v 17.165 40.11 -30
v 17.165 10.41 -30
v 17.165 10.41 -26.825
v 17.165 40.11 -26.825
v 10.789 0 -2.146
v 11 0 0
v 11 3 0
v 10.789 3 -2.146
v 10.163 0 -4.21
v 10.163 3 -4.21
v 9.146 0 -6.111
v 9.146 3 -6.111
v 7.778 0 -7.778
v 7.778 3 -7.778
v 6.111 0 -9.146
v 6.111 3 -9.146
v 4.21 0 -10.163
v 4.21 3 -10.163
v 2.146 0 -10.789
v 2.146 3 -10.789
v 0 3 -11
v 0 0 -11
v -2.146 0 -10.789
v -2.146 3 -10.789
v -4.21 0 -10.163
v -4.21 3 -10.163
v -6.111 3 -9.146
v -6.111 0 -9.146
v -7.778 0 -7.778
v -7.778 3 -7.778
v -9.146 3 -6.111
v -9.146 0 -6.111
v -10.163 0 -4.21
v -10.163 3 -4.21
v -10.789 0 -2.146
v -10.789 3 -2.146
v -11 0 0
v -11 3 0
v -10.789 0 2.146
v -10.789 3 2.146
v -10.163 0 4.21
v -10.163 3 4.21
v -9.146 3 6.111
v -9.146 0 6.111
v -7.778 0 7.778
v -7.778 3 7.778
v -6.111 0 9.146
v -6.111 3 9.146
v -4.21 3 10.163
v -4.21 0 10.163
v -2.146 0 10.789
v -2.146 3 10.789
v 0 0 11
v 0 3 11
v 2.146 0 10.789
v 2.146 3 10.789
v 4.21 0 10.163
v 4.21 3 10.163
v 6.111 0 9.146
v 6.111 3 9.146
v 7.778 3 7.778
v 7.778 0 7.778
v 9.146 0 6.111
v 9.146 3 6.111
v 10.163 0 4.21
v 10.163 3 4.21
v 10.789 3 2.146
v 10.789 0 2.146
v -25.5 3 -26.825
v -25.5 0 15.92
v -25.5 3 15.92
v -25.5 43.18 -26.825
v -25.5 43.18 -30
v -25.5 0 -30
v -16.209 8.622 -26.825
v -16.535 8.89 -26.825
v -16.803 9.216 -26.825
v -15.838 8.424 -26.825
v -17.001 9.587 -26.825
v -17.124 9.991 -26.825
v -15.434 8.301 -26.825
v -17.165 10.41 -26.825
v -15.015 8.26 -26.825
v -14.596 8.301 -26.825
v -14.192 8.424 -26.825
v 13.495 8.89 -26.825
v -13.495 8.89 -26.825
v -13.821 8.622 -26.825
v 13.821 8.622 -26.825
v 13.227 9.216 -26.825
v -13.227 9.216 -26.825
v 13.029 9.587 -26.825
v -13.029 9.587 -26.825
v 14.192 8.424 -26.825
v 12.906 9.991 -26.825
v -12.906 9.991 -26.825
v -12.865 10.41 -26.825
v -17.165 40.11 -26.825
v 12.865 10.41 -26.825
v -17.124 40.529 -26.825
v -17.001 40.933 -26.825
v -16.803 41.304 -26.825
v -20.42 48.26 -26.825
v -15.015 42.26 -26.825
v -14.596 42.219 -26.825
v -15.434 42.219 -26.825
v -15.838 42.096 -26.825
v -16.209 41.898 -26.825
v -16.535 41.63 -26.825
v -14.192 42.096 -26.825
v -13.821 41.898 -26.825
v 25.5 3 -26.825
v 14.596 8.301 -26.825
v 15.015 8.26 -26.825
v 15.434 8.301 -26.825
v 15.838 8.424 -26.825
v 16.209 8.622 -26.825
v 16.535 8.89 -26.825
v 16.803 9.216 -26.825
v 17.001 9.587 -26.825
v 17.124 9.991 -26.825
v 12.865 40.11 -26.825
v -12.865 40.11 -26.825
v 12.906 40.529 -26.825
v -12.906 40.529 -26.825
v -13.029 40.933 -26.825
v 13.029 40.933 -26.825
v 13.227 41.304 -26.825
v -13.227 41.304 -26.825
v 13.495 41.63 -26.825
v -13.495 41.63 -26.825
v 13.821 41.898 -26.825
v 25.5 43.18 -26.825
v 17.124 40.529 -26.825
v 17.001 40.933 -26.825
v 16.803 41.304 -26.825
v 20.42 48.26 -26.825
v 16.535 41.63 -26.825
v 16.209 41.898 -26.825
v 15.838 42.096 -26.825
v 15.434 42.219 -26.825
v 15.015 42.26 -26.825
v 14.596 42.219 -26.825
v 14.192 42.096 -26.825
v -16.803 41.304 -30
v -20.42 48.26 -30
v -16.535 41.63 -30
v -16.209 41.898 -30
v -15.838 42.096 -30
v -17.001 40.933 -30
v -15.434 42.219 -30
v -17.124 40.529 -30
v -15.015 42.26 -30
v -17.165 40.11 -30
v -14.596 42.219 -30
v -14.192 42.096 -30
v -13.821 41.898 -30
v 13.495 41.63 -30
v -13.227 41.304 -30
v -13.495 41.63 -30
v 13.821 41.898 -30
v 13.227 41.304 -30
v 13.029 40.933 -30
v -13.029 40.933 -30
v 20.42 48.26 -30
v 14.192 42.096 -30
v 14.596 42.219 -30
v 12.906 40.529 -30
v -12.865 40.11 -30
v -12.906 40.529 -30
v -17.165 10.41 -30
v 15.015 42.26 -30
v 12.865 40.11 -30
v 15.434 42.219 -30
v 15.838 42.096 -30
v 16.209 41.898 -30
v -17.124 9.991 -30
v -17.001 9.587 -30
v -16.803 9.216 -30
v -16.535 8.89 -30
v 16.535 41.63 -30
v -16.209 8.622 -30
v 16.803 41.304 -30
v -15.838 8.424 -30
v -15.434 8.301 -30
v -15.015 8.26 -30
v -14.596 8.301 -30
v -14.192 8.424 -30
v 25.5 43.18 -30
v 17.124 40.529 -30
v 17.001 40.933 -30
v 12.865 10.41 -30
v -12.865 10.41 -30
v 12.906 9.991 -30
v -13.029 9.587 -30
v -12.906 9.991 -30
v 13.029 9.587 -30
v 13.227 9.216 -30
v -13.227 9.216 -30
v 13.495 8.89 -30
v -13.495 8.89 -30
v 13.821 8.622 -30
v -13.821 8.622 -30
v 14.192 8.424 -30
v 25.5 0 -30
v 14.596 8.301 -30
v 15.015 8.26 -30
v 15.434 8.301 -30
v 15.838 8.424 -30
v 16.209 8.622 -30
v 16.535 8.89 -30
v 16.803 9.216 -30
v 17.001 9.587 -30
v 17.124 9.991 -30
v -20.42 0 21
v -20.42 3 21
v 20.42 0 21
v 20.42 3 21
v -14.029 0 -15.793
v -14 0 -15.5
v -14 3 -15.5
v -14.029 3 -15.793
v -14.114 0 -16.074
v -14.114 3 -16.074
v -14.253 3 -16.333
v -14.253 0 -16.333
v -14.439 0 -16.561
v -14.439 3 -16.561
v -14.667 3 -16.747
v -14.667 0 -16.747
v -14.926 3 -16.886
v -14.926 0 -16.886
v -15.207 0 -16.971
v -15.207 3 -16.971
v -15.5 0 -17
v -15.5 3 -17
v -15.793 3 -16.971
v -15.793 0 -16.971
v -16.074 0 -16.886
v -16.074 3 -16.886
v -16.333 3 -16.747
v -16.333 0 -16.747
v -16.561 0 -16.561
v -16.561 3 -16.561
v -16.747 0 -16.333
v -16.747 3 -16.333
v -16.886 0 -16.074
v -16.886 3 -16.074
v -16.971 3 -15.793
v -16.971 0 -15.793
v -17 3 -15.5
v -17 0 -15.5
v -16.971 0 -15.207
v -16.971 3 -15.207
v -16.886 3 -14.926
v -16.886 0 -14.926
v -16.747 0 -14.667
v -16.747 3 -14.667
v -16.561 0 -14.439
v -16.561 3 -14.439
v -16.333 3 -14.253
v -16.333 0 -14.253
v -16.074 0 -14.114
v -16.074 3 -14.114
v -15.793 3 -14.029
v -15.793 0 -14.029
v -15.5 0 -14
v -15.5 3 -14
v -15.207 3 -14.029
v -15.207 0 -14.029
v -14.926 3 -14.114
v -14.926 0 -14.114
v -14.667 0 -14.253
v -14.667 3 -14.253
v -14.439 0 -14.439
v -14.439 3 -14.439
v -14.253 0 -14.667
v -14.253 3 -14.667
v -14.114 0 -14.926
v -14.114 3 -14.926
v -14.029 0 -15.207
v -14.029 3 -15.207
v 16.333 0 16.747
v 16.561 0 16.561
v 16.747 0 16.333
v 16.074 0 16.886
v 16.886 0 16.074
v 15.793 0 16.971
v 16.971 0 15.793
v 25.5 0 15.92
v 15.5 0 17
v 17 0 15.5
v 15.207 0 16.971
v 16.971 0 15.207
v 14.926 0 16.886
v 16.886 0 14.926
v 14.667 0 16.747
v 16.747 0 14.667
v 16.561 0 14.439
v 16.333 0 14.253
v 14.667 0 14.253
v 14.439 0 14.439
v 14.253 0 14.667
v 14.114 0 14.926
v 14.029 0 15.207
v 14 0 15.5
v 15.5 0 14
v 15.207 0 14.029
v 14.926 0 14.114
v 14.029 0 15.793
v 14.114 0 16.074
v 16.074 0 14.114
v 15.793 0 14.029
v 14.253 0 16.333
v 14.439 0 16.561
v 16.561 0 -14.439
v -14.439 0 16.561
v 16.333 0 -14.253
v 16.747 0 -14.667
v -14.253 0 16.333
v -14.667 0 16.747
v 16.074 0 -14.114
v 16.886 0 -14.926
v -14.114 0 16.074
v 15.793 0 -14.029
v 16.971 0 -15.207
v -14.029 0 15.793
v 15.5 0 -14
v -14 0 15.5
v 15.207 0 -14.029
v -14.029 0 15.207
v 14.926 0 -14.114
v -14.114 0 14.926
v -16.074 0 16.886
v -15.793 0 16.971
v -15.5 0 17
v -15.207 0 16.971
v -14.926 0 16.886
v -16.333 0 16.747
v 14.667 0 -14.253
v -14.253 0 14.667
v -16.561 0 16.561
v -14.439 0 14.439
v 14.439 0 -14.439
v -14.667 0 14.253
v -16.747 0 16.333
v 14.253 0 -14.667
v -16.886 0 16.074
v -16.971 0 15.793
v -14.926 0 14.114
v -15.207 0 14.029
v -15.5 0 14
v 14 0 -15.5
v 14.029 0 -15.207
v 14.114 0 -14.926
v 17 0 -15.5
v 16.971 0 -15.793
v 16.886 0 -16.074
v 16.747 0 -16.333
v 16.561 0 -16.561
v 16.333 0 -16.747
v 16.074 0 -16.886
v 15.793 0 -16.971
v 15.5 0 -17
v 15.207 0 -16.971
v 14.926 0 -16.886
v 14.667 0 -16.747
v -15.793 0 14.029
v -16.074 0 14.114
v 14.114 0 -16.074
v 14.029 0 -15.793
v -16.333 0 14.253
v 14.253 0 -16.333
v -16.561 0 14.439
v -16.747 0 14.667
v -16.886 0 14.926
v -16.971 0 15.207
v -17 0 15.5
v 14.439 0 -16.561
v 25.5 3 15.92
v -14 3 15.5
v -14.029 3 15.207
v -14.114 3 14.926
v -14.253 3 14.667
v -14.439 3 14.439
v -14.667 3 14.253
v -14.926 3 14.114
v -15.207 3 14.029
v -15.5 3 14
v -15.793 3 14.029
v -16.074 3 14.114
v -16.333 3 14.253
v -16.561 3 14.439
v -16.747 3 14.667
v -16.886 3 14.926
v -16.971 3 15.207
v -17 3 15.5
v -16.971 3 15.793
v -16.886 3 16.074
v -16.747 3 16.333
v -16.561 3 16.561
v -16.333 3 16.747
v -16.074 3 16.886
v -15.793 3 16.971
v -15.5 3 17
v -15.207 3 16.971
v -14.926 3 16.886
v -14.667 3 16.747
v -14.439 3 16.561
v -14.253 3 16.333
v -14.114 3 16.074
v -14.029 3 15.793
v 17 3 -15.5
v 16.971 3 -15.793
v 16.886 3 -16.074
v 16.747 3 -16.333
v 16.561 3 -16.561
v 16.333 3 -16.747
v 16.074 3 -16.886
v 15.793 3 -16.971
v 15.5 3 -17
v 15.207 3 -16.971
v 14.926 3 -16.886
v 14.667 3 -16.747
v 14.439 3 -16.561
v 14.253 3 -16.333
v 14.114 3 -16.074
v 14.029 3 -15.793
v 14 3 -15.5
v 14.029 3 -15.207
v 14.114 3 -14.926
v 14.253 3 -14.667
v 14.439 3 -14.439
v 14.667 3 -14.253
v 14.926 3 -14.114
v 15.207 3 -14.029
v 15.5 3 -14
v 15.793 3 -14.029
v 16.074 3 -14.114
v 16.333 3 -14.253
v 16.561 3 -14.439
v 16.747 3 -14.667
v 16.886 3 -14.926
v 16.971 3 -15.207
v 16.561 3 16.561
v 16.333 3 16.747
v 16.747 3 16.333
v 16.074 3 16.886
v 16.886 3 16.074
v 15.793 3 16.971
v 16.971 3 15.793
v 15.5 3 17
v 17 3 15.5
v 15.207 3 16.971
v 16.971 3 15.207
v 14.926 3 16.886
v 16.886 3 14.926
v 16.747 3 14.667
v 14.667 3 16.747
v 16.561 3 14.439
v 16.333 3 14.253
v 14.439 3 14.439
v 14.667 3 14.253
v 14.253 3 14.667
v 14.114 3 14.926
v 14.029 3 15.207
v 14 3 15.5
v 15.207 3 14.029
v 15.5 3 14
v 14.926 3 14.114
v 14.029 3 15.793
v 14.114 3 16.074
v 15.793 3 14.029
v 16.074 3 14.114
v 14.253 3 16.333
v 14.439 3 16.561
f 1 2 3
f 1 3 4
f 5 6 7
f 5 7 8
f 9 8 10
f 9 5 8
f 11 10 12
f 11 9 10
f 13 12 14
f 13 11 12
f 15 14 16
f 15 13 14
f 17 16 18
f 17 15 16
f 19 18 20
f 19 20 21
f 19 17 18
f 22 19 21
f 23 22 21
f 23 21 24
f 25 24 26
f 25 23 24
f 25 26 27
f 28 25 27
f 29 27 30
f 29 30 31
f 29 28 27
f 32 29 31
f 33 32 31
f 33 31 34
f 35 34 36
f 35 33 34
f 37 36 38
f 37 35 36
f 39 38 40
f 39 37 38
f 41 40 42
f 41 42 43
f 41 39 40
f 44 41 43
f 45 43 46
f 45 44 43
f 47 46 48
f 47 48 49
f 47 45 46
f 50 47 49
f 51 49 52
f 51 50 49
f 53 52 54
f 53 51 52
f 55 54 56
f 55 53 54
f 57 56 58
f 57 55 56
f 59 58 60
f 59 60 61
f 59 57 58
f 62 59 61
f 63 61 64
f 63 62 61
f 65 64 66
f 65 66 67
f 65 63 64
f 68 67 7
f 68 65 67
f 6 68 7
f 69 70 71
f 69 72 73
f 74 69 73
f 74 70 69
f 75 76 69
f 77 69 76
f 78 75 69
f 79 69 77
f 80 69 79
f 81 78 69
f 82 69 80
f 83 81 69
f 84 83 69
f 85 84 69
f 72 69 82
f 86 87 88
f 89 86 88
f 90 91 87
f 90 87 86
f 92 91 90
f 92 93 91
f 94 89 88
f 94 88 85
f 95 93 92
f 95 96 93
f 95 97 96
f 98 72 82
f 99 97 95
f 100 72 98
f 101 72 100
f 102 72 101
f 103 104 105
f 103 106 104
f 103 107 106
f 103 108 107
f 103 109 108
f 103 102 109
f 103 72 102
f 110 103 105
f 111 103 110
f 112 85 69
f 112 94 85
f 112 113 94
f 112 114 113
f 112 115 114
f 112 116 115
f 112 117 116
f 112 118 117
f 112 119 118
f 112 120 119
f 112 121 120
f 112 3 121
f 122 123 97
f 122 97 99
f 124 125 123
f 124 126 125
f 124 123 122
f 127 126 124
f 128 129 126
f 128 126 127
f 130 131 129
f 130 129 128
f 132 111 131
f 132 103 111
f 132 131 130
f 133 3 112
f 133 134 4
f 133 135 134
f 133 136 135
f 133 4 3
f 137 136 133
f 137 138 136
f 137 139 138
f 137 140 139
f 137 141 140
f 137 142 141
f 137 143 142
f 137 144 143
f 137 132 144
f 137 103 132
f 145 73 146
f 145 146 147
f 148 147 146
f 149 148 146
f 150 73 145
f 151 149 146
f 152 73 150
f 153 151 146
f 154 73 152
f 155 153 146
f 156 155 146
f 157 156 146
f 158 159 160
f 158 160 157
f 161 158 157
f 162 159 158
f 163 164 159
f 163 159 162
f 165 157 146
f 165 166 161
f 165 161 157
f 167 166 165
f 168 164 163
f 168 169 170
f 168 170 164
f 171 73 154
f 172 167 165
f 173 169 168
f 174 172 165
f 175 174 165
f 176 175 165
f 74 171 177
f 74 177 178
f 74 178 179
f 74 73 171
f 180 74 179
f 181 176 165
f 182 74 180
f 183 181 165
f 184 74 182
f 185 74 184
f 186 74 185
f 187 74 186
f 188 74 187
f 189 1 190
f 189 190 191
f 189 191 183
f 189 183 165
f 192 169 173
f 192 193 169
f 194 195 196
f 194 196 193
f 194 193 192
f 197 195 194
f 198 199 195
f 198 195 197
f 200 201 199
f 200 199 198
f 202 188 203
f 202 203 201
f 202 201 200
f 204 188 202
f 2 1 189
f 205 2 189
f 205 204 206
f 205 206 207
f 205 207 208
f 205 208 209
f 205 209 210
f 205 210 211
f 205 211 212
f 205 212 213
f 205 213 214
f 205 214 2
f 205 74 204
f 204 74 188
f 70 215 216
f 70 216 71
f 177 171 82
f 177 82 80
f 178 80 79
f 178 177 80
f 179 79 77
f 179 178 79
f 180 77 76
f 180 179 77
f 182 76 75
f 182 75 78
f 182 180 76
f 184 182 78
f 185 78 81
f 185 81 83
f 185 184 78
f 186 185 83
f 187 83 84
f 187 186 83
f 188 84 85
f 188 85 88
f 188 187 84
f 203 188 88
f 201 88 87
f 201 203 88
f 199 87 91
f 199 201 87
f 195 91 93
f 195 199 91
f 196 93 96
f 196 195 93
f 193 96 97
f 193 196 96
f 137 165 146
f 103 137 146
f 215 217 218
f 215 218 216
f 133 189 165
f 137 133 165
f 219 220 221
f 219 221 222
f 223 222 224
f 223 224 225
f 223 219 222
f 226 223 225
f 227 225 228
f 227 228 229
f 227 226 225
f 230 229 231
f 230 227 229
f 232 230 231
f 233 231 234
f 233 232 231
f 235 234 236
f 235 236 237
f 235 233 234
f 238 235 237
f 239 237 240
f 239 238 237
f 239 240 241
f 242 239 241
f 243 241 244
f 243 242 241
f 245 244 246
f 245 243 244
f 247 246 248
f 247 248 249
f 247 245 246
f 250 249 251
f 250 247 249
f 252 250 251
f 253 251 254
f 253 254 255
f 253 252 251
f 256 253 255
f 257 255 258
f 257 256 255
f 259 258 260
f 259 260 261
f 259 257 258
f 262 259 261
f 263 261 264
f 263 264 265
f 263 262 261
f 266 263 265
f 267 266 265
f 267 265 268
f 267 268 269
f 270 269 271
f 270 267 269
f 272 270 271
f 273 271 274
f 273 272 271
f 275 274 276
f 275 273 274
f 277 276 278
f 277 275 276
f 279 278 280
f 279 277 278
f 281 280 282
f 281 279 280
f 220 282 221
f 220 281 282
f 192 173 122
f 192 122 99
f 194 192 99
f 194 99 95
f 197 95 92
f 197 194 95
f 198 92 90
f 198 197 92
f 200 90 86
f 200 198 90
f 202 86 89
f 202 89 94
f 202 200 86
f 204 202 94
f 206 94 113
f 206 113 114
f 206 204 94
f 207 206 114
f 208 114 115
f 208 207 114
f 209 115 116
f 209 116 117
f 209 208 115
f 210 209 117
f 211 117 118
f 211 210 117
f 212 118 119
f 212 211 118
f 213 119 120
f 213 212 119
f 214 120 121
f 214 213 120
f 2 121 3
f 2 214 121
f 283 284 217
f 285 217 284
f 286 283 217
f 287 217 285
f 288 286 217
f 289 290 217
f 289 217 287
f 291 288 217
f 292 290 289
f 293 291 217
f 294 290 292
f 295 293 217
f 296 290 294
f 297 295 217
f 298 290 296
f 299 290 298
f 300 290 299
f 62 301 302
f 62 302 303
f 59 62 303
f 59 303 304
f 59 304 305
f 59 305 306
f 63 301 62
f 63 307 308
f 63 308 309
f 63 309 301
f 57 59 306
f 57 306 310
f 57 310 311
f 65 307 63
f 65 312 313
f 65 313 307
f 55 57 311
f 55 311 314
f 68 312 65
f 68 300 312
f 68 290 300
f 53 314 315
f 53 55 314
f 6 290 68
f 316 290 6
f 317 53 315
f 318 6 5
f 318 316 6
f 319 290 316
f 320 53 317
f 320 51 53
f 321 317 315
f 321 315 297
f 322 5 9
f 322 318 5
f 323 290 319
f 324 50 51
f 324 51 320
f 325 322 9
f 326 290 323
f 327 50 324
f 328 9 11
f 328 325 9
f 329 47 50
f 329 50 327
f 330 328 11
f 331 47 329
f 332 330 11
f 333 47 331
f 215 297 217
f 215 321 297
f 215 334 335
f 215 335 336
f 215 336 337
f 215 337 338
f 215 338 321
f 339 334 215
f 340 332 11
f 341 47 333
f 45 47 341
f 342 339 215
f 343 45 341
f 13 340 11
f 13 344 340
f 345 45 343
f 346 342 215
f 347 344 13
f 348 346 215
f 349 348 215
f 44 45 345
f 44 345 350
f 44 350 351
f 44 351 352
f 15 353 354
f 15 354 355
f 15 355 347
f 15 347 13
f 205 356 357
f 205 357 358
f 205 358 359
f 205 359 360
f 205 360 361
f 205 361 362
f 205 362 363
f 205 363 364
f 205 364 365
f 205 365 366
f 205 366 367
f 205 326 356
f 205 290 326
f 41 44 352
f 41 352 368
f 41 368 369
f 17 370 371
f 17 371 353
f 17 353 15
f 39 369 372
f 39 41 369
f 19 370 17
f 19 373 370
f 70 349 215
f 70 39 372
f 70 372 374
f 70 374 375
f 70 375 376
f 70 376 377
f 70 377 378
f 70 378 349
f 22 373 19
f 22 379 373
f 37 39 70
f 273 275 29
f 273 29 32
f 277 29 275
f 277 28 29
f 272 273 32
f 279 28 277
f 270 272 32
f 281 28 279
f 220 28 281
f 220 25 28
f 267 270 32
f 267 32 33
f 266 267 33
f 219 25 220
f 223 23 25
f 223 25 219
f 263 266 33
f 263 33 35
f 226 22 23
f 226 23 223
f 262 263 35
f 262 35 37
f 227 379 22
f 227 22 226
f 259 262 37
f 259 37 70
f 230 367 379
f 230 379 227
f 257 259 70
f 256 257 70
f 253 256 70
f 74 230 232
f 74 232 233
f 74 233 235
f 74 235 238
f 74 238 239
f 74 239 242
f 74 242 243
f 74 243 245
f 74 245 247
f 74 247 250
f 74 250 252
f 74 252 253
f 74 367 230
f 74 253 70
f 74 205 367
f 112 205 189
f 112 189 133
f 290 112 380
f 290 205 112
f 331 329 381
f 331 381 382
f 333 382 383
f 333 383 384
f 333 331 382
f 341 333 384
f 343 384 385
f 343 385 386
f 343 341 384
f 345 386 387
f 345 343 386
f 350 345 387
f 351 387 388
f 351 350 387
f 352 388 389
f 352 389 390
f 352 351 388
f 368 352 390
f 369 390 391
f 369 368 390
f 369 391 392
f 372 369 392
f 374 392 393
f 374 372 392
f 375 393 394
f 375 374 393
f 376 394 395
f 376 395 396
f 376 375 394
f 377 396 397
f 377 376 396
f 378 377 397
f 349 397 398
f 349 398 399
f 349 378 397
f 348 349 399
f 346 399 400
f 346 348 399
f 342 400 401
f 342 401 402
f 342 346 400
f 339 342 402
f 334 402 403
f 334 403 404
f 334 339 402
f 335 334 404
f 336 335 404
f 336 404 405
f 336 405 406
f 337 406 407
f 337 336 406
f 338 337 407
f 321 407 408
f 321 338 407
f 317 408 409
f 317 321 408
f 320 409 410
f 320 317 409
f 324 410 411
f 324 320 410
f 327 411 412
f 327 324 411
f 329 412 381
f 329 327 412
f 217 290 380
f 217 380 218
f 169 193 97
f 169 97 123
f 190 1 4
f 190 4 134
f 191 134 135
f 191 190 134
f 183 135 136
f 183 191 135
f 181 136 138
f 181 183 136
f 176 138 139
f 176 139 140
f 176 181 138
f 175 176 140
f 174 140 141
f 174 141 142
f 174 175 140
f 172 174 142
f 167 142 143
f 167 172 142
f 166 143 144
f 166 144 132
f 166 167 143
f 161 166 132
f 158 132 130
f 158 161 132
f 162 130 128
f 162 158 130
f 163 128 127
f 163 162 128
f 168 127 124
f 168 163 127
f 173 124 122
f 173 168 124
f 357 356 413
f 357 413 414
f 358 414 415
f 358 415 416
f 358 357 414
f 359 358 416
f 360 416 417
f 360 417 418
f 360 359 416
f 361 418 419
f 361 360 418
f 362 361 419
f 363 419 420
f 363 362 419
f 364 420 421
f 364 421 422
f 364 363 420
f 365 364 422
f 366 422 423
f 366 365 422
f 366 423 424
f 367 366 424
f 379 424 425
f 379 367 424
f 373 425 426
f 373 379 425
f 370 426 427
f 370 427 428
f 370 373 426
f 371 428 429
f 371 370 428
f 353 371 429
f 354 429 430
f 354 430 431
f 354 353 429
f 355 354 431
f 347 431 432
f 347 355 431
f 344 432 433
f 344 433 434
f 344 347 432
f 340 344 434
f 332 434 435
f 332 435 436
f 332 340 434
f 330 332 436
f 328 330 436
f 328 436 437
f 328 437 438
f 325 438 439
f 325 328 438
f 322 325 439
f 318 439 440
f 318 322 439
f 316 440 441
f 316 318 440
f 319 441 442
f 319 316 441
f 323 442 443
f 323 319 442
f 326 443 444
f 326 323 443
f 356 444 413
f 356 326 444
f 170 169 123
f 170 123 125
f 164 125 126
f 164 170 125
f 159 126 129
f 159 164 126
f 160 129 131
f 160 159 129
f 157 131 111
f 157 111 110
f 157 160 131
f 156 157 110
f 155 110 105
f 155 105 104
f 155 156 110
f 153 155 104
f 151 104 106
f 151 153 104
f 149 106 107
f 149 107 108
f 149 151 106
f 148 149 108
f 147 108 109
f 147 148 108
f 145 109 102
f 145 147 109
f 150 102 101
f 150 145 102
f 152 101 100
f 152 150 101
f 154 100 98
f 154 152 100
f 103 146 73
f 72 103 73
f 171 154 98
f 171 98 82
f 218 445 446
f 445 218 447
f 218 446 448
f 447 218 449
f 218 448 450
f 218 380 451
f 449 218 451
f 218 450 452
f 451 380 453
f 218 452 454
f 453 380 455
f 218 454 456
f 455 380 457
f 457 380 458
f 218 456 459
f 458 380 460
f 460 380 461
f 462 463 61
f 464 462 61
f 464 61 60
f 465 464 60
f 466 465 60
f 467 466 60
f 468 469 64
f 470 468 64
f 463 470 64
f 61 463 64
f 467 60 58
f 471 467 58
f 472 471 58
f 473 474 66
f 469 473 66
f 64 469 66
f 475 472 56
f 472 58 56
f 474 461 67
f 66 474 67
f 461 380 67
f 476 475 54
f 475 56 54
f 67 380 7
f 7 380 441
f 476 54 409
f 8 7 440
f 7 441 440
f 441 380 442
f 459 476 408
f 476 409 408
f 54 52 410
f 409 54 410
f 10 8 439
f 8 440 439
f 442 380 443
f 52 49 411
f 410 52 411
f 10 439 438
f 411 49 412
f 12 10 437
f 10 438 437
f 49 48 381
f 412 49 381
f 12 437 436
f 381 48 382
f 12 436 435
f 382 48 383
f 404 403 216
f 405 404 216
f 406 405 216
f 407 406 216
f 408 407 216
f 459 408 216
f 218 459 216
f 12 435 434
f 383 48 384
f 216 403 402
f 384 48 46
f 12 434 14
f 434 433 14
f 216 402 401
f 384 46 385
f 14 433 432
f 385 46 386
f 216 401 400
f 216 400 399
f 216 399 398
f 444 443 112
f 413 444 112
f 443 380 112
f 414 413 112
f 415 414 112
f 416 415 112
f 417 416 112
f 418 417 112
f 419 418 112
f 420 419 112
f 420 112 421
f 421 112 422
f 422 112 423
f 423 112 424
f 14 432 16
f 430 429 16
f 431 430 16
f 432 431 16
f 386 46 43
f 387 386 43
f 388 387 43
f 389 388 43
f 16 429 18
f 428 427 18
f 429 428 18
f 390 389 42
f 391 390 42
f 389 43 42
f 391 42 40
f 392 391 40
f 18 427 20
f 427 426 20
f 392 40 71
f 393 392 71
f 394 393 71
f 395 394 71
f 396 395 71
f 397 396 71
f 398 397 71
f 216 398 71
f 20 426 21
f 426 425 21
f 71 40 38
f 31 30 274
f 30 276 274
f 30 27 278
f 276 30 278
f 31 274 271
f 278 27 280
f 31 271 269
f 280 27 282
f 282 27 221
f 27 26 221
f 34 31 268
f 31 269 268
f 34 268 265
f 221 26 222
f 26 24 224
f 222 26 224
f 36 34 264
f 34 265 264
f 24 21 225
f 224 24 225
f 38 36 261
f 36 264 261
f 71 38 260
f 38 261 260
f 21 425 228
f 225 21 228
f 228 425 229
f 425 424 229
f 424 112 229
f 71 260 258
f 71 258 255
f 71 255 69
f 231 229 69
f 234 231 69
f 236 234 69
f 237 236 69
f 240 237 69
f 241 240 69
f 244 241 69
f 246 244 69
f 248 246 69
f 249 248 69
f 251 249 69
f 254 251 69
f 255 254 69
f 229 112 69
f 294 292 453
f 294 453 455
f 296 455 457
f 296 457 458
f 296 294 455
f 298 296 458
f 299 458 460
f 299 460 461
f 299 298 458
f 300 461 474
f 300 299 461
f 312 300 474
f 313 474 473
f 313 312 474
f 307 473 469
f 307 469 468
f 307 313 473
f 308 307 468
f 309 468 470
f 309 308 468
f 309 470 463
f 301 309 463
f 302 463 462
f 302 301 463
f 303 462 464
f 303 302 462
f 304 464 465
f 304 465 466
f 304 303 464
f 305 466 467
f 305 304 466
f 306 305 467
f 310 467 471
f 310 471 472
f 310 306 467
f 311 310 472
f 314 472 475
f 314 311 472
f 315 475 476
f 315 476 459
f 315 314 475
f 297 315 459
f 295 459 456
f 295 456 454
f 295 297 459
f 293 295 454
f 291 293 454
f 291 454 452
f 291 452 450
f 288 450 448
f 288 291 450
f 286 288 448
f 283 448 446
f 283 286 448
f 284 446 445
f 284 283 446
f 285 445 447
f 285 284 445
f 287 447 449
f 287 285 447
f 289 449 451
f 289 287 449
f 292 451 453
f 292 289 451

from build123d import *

# Parameters (mm, degrees)
SKETCH1_R           = 11
SKETCH1_R_2         = 1.5
BOSS_EXTRUDE1_DEPTH = 3
BOSS_EXTRUDE2_DEPTH = 3.175


with BuildPart() as part:
    # Sketch1 → Boss-Extrude1 (new body)
    with BuildSketch(Plane(origin=(0, 0, 0), x_dir=(1, 0, 0), z_dir=(0, 1, 0))):
        Polygon((20.42, -21), (-20.42, -21), (-25.5, -15.92), (-25.5, 30), (25.5, 30), (25.5, -15.92), align=None)
        Circle(SKETCH1_R, mode=Mode.SUBTRACT)
        with Locations((15.5, -15.5)):
            Circle(SKETCH1_R_2, mode=Mode.SUBTRACT)
        with Locations((-15.5, -15.5)):
            Circle(SKETCH1_R_2, mode=Mode.SUBTRACT)
        with Locations((-15.5, 15.5)):
            Circle(SKETCH1_R_2, mode=Mode.SUBTRACT)
        with Locations((15.5, 15.5)):
            Circle(SKETCH1_R_2, mode=Mode.SUBTRACT)
    extrude(amount=BOSS_EXTRUDE1_DEPTH)

    # Sketch2 → Boss-Extrude2 (add)
    with BuildSketch(Plane.XY.offset(-30)):
        Polygon((-25.5, 0), (25.5, 0), (25.5, 43.18), (20.42, 48.26), (-20.42, 48.26), (-25.5, 43.18), align=None)
        with BuildLine():
            Line((-17.165, 40.11), (-17.165, 10.41))
            ThreePointArc((-17.165, 10.41), (-15.015, 8.26), (-12.865, 10.41))
            Line((-12.865, 10.41), (-12.865, 40.11))
            ThreePointArc((-12.865, 40.11), (-15.015, 42.26), (-17.165, 40.11))
        make_face(mode=Mode.SUBTRACT)
        with BuildLine():
            Line((12.865, 40.11), (12.865, 10.41))
            ThreePointArc((12.865, 10.41), (15.015, 8.26), (17.165, 10.41))
            Line((17.165, 10.41), (17.165, 40.11))
            ThreePointArc((17.165, 40.11), (15.015, 42.26), (12.865, 40.11))
        make_face(mode=Mode.SUBTRACT)
    extrude(amount=BOSS_EXTRUDE2_DEPTH)


solid = part.part
